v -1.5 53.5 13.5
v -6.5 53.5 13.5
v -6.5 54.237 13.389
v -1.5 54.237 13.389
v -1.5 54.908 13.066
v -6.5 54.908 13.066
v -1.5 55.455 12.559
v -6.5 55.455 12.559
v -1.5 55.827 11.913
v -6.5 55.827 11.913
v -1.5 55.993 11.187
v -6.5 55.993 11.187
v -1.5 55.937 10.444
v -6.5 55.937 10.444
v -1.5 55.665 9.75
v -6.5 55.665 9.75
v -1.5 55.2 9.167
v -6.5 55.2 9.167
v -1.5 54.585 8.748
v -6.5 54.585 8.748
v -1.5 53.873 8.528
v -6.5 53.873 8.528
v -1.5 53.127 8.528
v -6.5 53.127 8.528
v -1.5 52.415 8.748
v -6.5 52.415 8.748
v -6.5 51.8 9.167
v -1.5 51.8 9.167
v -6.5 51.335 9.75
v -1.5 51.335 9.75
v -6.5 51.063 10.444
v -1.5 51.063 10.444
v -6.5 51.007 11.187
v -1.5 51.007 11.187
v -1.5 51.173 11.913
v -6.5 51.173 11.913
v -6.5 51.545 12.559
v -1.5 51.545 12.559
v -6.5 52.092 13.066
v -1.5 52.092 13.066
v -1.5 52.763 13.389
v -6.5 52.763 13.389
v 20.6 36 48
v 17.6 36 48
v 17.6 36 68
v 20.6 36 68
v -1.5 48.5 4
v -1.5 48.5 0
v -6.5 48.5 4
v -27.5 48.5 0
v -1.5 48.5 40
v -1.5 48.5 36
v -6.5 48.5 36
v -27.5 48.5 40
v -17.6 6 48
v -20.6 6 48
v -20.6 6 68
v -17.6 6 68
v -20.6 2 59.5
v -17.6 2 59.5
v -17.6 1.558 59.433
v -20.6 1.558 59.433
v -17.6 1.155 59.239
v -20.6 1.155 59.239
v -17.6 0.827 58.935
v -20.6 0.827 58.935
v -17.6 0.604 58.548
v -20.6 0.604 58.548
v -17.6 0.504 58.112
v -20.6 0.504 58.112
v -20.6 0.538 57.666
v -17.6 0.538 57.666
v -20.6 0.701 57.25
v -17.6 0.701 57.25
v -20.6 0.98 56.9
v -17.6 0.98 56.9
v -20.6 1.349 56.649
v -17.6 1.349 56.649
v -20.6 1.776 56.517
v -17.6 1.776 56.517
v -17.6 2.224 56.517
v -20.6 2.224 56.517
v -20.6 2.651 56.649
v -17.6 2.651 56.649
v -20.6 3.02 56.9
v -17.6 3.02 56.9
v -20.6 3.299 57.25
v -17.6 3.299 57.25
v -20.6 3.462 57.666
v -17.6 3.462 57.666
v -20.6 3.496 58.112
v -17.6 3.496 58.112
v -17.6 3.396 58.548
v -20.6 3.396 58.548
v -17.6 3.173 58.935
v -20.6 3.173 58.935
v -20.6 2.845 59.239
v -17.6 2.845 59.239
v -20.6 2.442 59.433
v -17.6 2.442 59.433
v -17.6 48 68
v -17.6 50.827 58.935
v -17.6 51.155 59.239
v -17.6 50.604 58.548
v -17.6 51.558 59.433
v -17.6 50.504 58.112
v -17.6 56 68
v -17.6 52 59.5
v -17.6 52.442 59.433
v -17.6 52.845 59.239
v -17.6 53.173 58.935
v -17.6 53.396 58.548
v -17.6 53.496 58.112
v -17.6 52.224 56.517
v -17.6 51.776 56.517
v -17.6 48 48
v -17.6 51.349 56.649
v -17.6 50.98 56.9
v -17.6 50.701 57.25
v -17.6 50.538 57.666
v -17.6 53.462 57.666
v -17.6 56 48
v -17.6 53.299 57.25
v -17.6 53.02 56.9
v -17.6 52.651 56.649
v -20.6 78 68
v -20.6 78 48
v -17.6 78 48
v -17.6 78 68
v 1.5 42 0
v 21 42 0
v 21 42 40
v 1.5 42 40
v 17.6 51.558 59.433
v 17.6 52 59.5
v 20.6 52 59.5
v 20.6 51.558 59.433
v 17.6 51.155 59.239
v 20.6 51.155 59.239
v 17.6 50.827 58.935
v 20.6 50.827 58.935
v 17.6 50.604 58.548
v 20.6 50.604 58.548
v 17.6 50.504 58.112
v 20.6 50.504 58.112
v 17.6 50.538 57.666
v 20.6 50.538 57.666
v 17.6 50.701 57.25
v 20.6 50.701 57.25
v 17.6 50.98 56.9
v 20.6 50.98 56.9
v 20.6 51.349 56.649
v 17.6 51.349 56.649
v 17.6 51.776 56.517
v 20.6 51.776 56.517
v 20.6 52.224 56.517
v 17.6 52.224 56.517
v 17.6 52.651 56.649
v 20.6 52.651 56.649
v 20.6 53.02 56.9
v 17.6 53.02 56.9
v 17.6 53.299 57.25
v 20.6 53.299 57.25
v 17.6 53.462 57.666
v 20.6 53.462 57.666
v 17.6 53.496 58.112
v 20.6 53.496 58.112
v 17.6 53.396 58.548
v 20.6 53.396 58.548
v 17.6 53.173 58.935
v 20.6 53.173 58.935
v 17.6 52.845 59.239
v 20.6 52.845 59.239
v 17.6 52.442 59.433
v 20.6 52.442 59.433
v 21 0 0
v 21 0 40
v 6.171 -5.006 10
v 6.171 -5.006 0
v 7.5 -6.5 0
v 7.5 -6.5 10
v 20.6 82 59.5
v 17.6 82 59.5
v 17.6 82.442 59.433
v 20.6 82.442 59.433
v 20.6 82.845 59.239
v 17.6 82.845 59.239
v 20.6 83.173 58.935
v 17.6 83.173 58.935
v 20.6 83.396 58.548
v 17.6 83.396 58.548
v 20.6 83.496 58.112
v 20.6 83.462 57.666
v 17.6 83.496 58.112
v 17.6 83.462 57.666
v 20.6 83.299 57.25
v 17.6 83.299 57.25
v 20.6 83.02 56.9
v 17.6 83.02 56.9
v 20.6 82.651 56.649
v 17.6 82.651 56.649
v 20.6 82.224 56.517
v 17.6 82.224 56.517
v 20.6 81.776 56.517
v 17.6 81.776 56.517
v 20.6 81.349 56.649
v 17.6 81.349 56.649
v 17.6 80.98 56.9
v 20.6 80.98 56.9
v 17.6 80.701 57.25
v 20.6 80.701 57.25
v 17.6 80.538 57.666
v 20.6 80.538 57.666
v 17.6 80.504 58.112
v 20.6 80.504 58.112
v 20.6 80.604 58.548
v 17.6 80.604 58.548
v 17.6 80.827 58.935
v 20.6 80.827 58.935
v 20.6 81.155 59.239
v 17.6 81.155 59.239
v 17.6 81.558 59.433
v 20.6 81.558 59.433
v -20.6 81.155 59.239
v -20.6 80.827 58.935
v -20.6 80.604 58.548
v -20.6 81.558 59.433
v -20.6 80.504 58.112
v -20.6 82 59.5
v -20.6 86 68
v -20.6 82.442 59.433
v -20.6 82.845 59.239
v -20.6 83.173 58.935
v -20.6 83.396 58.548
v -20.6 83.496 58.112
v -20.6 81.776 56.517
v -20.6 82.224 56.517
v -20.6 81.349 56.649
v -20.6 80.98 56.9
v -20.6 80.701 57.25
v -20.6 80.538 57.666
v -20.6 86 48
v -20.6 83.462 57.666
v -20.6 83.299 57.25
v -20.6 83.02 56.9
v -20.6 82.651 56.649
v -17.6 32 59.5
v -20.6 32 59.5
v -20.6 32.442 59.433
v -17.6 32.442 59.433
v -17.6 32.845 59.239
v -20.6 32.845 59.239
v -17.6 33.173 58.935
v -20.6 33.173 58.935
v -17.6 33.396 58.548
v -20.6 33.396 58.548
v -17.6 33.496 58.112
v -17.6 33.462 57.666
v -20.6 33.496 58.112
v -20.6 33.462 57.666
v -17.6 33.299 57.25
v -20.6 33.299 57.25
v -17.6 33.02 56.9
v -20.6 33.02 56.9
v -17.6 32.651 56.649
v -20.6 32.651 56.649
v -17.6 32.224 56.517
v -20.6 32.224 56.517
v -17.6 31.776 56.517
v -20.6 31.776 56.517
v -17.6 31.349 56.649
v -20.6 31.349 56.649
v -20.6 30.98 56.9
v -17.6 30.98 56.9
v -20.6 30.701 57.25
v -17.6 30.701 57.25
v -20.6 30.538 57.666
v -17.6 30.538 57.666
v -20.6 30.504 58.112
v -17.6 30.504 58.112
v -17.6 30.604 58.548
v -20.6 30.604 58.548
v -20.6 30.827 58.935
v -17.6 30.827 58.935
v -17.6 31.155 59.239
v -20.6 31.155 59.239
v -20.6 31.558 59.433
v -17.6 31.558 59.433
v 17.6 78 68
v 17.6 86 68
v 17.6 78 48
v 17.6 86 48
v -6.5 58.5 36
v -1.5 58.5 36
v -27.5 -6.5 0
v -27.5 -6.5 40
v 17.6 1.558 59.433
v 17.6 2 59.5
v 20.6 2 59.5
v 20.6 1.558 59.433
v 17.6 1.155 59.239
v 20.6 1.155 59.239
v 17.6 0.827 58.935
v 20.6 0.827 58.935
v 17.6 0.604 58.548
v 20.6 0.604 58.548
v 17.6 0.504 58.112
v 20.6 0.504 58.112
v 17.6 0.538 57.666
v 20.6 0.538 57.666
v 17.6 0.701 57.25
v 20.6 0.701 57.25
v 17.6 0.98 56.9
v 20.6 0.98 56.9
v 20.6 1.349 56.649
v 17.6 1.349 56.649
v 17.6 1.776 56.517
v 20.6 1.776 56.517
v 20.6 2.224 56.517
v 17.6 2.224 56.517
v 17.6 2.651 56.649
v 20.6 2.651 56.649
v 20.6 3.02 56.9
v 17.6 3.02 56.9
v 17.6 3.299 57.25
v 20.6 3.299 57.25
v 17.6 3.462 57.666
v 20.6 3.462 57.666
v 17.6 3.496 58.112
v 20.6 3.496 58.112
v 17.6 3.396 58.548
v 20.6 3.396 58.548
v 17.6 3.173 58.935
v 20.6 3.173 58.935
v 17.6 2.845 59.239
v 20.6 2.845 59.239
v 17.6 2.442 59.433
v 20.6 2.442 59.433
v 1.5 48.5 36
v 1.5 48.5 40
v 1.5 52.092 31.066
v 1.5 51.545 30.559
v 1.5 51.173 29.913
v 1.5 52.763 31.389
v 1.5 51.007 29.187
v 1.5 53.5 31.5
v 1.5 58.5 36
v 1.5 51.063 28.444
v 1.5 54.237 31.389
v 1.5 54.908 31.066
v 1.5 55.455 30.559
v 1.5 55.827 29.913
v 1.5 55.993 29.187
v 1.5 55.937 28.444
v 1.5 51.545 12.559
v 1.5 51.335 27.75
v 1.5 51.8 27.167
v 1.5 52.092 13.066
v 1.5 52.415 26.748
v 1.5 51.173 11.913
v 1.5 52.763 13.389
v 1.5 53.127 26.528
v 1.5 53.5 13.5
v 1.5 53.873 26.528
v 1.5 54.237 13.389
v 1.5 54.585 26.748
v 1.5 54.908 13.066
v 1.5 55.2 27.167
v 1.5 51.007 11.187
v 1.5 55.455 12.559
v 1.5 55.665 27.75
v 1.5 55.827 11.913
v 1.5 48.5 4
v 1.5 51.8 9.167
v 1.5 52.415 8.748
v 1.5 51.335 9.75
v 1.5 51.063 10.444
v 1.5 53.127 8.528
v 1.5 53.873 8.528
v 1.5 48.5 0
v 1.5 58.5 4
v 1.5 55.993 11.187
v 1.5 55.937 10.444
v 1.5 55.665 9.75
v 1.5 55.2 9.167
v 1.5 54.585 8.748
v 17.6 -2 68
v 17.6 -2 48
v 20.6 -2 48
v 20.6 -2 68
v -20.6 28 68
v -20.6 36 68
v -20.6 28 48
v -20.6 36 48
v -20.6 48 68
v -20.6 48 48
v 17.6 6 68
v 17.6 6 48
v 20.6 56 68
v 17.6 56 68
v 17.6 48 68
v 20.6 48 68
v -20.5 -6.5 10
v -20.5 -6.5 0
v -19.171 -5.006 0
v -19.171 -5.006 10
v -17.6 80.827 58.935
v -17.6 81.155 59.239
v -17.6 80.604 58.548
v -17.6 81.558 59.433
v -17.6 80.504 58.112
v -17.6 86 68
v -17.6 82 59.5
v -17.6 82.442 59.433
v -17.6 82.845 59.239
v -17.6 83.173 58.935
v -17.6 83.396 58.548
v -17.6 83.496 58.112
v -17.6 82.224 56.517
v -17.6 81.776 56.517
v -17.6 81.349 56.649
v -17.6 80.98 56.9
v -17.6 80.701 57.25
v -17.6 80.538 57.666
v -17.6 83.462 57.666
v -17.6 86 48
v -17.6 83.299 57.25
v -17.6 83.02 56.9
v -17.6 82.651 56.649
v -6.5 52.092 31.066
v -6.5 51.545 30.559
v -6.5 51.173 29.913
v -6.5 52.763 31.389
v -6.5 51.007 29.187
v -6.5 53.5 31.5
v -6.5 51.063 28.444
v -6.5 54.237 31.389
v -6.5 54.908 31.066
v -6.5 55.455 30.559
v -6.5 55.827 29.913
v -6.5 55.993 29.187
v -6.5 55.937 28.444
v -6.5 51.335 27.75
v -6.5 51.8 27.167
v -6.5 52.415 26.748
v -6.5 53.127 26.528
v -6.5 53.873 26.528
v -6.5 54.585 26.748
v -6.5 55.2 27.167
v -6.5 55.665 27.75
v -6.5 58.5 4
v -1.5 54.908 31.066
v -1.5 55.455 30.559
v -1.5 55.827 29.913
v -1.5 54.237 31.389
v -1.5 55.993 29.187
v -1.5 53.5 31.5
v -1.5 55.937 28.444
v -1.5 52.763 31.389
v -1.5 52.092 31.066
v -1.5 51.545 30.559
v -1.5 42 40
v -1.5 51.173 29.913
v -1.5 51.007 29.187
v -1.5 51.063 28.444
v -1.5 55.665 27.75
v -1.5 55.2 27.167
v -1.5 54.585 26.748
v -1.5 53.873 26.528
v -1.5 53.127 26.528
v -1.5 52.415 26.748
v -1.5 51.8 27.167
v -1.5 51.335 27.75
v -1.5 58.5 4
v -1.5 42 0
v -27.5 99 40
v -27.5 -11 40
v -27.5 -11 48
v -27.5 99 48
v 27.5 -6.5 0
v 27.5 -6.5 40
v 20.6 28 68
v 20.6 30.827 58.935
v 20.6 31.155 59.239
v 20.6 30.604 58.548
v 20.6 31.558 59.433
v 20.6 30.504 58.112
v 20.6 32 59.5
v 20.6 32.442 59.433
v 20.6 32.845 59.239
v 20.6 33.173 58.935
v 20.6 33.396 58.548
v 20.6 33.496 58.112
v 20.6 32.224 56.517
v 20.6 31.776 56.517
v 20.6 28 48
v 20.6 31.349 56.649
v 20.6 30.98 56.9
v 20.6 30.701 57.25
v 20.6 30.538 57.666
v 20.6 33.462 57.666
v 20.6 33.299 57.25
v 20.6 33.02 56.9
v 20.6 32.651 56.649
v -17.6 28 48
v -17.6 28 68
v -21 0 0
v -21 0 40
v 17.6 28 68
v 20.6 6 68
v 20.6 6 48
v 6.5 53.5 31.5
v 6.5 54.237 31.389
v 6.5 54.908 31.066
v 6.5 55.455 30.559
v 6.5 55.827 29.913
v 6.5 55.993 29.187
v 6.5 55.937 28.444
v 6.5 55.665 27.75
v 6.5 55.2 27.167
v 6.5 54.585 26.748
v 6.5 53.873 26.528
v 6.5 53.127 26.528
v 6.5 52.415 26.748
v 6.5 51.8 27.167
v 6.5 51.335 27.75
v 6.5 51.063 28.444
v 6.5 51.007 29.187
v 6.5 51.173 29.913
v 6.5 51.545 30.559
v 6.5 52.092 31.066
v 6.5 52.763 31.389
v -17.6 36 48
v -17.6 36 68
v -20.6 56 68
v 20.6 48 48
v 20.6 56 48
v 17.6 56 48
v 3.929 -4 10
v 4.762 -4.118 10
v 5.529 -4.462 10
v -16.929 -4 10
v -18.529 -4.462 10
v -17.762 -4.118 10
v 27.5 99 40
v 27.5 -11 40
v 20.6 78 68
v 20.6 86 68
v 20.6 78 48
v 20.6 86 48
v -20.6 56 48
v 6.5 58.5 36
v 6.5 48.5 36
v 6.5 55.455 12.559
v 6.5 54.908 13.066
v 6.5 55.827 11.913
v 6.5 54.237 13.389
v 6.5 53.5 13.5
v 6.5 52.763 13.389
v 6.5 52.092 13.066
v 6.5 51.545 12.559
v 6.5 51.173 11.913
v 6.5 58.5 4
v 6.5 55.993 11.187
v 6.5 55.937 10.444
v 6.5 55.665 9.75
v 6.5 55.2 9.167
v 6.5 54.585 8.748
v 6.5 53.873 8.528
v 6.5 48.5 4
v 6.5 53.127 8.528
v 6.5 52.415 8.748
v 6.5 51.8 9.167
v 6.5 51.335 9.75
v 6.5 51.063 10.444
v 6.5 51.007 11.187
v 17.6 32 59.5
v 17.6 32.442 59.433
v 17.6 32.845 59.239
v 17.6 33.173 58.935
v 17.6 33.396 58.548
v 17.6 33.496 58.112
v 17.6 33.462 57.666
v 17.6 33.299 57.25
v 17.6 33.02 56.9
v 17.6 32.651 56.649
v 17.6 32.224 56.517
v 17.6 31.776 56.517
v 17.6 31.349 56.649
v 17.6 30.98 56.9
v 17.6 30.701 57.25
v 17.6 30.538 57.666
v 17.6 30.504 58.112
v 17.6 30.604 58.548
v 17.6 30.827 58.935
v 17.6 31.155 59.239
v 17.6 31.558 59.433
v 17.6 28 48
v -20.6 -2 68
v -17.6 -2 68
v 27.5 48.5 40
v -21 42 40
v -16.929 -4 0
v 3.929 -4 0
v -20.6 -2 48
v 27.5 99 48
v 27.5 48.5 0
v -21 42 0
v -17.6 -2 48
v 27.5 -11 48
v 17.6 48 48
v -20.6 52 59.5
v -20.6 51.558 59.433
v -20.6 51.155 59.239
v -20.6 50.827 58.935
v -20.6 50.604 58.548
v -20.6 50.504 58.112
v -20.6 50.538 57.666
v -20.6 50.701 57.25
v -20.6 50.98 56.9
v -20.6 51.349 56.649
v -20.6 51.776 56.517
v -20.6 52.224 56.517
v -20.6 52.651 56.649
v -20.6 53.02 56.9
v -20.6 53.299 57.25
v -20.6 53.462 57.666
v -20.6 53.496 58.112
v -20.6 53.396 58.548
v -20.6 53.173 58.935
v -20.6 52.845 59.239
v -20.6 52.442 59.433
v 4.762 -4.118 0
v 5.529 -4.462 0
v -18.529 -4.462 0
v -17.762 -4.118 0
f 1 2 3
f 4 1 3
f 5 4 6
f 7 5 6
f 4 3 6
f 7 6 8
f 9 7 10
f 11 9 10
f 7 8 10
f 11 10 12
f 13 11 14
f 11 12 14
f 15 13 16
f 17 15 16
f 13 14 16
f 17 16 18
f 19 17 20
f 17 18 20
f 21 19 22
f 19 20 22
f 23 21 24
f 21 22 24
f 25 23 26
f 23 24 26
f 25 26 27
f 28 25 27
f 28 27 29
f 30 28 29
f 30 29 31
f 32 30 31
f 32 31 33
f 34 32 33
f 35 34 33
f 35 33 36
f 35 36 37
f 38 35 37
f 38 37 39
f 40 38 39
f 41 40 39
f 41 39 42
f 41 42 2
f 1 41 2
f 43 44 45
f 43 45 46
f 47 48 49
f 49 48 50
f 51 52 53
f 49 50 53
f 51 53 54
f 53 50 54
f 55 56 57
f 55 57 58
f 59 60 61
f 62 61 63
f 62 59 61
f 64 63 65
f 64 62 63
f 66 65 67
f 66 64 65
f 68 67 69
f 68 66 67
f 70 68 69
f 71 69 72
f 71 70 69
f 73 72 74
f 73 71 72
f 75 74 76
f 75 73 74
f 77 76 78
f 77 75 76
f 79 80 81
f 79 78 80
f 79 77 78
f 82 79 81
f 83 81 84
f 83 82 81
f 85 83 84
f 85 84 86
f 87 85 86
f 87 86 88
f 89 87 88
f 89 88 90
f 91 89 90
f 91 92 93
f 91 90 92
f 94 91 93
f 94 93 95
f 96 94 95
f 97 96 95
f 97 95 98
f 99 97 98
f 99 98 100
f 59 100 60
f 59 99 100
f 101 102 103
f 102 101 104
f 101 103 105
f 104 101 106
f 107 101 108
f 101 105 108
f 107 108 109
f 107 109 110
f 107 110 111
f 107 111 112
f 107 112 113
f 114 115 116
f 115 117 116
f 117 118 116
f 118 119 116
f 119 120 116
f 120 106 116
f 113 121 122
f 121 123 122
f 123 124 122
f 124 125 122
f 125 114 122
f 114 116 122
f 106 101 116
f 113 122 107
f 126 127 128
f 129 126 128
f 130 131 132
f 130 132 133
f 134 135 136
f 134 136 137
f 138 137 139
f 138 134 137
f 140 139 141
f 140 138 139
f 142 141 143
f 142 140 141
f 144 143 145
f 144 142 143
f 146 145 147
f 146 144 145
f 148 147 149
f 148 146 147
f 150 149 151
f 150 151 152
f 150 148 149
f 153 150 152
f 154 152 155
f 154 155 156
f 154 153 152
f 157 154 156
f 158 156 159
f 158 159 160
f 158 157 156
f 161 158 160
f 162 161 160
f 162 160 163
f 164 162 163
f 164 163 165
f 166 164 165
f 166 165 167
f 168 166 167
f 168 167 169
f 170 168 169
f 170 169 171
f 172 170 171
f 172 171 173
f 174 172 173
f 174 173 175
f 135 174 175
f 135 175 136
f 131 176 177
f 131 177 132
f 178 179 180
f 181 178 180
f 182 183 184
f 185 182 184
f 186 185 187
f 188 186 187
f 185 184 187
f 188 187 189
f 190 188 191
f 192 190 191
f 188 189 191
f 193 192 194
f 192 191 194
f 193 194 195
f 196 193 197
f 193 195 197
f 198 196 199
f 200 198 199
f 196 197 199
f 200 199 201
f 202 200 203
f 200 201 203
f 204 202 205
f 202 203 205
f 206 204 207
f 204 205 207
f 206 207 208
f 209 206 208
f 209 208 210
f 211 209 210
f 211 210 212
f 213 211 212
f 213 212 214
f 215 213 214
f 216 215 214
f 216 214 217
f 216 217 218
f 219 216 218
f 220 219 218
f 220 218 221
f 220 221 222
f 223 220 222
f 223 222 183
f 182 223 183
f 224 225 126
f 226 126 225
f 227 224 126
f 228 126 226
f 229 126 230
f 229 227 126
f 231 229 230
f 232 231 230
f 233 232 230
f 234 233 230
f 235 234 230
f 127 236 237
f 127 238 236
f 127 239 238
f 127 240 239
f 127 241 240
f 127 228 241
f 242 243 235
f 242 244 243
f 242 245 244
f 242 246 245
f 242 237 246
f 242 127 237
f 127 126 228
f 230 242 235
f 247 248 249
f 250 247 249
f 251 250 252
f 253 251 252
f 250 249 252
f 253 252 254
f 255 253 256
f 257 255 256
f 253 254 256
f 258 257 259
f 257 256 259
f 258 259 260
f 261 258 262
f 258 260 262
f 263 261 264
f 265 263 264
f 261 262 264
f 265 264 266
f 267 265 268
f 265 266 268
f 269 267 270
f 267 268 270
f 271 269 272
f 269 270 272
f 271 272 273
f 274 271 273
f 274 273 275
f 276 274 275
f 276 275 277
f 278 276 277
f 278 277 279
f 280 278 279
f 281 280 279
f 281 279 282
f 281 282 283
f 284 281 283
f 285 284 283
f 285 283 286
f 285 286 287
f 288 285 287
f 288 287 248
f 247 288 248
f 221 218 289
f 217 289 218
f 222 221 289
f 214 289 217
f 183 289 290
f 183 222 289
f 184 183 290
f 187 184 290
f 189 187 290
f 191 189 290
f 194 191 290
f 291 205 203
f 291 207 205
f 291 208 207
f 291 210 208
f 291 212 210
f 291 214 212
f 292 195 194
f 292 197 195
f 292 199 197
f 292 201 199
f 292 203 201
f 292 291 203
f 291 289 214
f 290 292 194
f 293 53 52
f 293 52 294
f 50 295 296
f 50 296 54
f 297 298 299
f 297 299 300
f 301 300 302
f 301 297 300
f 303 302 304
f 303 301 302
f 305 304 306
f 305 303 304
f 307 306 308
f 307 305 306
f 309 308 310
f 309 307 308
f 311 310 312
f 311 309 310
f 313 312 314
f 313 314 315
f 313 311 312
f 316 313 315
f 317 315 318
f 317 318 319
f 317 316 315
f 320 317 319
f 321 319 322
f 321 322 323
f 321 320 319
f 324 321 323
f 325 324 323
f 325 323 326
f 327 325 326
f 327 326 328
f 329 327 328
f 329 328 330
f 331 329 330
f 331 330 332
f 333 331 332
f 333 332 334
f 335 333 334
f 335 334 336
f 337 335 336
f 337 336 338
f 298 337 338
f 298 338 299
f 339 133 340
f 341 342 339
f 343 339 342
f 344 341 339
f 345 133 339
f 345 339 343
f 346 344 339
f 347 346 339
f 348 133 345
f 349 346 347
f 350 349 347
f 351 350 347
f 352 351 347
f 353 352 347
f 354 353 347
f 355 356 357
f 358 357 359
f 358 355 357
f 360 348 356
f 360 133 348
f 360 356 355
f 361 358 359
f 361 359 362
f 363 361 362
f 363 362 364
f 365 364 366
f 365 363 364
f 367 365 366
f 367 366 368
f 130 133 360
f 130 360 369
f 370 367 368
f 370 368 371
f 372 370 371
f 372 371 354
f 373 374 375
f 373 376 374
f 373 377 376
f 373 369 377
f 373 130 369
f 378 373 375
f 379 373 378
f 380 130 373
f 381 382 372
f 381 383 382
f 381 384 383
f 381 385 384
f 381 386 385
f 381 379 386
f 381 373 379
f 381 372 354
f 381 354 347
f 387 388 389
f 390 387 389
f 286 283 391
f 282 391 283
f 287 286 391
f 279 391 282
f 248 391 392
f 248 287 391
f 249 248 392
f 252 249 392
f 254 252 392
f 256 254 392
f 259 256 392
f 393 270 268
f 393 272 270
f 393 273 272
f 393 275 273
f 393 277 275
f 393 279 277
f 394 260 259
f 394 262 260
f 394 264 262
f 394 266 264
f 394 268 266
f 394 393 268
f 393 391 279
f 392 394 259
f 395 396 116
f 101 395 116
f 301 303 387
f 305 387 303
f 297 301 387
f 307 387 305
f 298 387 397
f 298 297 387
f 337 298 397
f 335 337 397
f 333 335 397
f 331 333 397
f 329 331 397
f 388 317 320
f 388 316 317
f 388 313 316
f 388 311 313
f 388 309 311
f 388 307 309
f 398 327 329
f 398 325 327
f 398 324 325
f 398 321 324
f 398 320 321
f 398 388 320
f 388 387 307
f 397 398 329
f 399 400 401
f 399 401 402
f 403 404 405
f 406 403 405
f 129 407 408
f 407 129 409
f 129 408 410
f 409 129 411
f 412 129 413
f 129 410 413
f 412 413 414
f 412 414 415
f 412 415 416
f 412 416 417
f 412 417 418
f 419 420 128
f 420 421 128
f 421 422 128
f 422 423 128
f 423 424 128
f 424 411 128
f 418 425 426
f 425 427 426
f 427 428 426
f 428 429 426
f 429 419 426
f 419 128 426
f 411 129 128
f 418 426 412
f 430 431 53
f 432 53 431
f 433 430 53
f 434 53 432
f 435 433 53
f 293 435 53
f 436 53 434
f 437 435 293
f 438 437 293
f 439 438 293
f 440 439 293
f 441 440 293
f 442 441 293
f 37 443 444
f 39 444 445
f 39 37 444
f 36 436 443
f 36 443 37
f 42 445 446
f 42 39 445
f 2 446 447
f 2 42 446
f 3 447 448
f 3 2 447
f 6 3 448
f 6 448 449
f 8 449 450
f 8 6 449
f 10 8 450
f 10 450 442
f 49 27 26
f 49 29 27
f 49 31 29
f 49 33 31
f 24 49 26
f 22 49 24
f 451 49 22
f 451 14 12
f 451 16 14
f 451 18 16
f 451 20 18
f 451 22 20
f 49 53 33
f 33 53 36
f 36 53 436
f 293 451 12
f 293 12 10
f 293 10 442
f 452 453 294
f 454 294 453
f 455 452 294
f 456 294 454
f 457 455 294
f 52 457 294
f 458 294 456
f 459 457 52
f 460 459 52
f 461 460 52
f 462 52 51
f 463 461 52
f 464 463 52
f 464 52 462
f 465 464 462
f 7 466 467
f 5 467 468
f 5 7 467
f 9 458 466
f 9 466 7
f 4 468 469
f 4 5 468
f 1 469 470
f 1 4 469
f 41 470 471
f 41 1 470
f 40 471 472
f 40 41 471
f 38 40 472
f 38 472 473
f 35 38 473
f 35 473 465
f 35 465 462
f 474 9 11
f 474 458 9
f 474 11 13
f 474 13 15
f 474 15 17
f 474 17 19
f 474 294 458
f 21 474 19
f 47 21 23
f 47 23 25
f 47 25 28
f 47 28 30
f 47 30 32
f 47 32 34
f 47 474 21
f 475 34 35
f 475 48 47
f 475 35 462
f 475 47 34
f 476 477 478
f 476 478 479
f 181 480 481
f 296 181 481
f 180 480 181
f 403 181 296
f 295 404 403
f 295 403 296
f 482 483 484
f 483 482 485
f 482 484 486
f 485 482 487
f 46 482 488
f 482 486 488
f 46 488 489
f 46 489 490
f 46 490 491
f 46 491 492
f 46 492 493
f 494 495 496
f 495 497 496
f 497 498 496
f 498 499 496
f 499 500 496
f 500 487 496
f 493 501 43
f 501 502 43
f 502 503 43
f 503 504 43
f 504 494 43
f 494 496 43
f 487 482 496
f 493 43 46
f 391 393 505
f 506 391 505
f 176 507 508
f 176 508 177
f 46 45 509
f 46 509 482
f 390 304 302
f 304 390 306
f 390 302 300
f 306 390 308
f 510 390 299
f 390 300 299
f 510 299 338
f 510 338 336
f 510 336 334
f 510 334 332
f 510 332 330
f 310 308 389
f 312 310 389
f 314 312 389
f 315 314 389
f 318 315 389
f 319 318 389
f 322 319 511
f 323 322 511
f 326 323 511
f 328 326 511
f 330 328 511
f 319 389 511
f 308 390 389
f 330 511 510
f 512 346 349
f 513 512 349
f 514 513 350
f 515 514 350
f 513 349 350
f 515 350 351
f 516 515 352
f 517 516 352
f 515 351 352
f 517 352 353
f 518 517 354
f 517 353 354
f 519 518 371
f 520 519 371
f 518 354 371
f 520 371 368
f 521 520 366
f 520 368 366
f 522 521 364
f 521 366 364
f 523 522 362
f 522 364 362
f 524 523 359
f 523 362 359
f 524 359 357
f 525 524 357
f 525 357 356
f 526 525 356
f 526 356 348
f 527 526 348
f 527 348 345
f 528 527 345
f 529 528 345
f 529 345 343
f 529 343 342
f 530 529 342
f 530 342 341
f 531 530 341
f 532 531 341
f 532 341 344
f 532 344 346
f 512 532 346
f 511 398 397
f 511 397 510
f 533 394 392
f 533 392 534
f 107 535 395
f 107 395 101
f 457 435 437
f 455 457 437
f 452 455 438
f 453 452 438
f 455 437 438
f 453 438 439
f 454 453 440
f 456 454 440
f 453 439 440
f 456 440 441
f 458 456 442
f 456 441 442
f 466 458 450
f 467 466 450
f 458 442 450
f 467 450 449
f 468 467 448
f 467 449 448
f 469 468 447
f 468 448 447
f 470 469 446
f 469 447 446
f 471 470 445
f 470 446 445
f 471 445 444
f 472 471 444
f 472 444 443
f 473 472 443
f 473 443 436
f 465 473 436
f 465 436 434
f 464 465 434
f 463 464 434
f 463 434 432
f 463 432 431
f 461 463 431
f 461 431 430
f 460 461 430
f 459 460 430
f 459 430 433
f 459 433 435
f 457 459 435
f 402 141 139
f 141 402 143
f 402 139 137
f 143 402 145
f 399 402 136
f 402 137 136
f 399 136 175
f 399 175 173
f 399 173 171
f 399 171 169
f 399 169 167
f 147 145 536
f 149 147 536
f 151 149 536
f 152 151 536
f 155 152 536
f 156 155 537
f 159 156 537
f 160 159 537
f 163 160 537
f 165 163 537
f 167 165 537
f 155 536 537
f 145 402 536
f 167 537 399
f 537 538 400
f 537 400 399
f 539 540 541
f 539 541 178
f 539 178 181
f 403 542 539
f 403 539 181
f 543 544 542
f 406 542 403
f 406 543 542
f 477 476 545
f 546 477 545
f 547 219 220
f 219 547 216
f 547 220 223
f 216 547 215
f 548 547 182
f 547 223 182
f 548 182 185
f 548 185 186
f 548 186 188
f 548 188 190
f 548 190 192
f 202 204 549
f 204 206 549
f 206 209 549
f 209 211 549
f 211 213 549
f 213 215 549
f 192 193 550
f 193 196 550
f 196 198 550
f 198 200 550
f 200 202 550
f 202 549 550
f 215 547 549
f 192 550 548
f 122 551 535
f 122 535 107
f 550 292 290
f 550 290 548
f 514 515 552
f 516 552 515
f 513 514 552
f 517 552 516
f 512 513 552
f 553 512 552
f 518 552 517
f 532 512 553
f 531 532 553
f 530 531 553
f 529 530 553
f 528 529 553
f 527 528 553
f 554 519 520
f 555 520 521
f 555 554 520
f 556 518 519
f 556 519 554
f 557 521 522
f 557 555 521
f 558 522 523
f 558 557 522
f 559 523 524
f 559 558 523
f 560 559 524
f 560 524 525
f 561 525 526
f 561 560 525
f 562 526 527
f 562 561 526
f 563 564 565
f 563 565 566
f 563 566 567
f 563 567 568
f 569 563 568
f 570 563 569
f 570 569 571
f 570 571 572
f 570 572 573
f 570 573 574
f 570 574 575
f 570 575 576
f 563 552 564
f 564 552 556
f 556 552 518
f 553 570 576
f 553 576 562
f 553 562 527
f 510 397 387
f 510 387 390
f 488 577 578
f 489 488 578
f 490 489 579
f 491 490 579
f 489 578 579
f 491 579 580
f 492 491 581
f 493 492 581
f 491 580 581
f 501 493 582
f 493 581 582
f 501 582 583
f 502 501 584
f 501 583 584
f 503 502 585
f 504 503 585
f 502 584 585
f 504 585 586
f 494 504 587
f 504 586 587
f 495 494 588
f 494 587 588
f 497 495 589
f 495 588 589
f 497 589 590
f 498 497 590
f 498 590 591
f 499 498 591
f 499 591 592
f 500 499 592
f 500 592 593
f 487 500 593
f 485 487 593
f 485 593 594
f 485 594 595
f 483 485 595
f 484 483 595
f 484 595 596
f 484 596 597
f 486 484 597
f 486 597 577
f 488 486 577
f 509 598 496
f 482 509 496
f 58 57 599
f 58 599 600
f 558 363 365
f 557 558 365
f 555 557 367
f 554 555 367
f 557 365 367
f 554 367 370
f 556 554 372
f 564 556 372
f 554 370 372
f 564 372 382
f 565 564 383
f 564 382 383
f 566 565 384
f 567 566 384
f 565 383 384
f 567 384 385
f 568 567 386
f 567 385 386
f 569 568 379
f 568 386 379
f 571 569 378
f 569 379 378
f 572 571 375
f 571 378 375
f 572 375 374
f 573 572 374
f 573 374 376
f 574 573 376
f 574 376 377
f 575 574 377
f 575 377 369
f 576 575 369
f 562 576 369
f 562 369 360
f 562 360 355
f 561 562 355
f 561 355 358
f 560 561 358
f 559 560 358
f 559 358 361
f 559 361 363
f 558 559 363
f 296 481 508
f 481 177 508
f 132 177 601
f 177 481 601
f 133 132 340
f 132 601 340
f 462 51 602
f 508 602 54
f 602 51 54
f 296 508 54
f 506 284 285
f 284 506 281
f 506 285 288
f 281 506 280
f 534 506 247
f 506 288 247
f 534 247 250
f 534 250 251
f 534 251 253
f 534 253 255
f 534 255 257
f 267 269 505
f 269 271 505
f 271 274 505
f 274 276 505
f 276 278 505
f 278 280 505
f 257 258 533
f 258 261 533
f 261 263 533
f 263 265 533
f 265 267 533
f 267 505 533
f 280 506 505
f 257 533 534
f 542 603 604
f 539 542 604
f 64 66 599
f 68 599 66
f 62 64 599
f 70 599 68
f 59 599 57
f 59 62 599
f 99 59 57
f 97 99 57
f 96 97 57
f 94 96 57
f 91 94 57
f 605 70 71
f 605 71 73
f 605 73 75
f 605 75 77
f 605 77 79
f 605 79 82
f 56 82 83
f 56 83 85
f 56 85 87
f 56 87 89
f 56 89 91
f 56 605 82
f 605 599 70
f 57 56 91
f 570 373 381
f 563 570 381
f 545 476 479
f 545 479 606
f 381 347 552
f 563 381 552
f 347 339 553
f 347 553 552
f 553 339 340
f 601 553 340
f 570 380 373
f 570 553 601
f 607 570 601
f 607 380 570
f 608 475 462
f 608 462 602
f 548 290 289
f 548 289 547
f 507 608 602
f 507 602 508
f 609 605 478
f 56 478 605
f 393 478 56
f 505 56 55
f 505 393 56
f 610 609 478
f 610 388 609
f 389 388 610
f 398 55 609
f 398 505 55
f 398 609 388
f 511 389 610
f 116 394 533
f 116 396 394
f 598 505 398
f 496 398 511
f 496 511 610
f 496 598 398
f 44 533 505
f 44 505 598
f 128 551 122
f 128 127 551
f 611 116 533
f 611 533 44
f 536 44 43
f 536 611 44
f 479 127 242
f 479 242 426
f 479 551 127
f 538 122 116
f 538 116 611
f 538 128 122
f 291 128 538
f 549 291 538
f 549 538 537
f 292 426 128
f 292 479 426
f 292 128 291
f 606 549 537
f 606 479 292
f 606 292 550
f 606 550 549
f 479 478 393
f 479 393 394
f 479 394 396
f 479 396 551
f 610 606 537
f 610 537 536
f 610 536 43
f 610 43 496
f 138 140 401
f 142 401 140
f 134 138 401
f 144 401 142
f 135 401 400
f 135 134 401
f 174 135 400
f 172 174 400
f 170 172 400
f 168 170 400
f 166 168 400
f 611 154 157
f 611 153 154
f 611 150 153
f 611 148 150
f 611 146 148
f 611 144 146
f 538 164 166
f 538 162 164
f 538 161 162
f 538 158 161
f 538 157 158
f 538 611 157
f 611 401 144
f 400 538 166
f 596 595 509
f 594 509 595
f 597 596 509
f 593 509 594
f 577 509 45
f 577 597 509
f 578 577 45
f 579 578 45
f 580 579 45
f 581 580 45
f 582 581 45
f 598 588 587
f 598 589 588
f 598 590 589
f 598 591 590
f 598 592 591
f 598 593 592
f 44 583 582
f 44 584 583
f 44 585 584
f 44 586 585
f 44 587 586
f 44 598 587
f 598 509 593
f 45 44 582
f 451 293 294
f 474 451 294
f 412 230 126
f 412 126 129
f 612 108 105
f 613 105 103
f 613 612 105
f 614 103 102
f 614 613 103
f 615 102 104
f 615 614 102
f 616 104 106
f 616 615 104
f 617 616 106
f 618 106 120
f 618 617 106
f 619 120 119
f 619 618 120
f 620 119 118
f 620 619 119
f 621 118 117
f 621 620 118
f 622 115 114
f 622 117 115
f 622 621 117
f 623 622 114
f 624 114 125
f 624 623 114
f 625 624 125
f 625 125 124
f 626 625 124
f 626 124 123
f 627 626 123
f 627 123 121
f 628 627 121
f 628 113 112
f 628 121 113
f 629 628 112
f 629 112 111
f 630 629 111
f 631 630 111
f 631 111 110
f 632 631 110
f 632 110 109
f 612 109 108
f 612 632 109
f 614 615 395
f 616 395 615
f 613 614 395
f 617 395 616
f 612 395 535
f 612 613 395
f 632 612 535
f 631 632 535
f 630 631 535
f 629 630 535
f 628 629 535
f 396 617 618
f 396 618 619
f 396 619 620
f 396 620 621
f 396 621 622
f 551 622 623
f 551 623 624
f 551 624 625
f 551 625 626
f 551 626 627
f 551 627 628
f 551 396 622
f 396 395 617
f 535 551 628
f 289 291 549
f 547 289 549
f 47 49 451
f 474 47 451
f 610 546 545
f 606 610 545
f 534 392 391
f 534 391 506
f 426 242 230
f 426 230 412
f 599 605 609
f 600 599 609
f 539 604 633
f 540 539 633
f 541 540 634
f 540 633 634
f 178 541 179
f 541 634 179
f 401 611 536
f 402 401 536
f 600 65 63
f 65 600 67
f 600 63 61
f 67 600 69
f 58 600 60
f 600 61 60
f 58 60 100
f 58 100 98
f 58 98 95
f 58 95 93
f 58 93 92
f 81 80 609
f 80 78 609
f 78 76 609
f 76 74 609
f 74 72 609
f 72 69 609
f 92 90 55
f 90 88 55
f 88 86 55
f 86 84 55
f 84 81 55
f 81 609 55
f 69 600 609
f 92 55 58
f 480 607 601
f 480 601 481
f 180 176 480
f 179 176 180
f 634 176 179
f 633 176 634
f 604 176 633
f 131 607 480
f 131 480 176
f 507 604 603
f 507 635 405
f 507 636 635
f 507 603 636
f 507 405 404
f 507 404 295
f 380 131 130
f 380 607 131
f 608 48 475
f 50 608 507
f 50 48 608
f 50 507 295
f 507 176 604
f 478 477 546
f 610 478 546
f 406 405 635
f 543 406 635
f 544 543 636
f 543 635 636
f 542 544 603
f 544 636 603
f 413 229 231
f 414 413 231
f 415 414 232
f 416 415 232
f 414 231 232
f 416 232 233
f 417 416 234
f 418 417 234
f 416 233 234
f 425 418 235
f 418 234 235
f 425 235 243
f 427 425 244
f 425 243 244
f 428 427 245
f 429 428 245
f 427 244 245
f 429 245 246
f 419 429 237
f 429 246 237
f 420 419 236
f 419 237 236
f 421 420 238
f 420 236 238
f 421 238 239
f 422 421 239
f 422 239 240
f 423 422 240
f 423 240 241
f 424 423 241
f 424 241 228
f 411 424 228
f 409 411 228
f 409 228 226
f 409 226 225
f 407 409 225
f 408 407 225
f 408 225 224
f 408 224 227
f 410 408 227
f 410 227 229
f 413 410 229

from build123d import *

# Parameters (mm, degrees)
BOSS_EXTRUDE1_DEPTH     = 40
SKETCH2_R               = 2.5
CUT_EXTRUDE1_DEPTH      = 13
CUT_EXTRUDE2_DEPTH      = 10
SKETCH6_W               = 55
SKETCH6_H               = 110
BOSS_EXTRUDE8_DEPTH     = 8
SKETCH7_W               = 4
SKETCH7_H               = 10
CUT_EXTRUDE3_DEPTH      = 13
SKETCH11_W              = 3
SKETCH11_H              = 8
BOSS_EXTRUDE9_DEPTH     = 20
SKETCH12_R              = 1.5
CUT_EXTRUDE4_DEPTH      = 41.2
MIRROR3_COPY_1_SKETCH_R = 1.5
MIRROR3_COPY_1_DEPTH    = 41.2


with BuildPart() as part:
    # Sketch1 → Boss-Extrude1 (new body)
    with BuildSketch(Plane.XY):
        Polygon((-21, 0), (21, 0), (21, 42), (1.5, 42), (1.5, 58.5), (6.5, 58.5), (6.5, 48.5), (27.5, 48.5), (27.5, -6.5), (-27.5, -6.5), (-27.5, 48.5), (-6.5, 48.5), (-6.5, 58.5), (-1.5, 58.5), (-1.5, 42), (-21, 42), align=None)
    extrude(amount=BOSS_EXTRUDE1_DEPTH)

    # Sketch2 → Cut-Extrude1 (cut)
    with BuildSketch(Plane.ZY.offset(6.5)):
        with Locations((11, 53.5)):
            Circle(SKETCH2_R)
        with Locations((29, 53.5)):
            Circle(SKETCH2_R)
    extrude(amount=-CUT_EXTRUDE1_DEPTH, mode=Mode.SUBTRACT)

    # Sketch3 → Cut-Extrude2 (cut)
    with BuildSketch(Plane(origin=(0, 0, 0), x_dir=(-1, 0, 0), z_dir=(0, 0, -1))):
        with BuildLine():
            Line((20.5, -6.5), (19.170549473, -5.005824209))
            ThreePointArc((19.170549473, -5.005824209), (18.157592064, -4.262982703), (16.929285786, -4))
            Line((16.929285786, -4), (-3.929285786, -4))
            ThreePointArc((-3.929285786, -4), (-5.157592064, -4.262982703), (-6.170549473, -5.005824209))
            Line((-6.170549473, -5.005824209), (-7.5, -6.5))
            Line((-7.5, -6.5), (20.5, -6.5))
        make_face()
    extrude(amount=-CUT_EXTRUDE2_DEPTH, mode=Mode.SUBTRACT)

    # Sketch7 → Cut-Extrude3 (cut)
    with BuildSketch(Plane.ZY.offset(6.5)):
        with Locations((38, 53.5)):
            Rectangle(SKETCH7_W, SKETCH7_H)
        with Locations((2, 53.5)):
            Rectangle(SKETCH7_W, SKETCH7_H)
    extrude(amount=-CUT_EXTRUDE3_DEPTH, mode=Mode.SUBTRACT)


with BuildPart() as body_2:
    # Sketch6 → Boss-Extrude8 (new body)
    with BuildSketch(Plane.XY.offset(40)):
        with Locations((0, 44)):
            Rectangle(SKETCH6_W, SKETCH6_H)
    extrude(amount=BOSS_EXTRUDE8_DEPTH)

    # Sketch11 → Boss-Extrude9 (add)
    with BuildSketch(Plane.XY.offset(48)):
        with Locations((-19.1, 82)):
            Rectangle(SKETCH11_W, SKETCH11_H)
        with Locations((-19.1, 2)):
            Rectangle(SKETCH11_W, SKETCH11_H)
        with Locations((19.1, 2)):
            Rectangle(SKETCH11_W, SKETCH11_H)
        with Locations((19.1, 82)):
            Rectangle(SKETCH11_W, SKETCH11_H)
        with Locations((19.1, 52)):
            Rectangle(SKETCH11_W, SKETCH11_H)
        with Locations((-19.1, 52)):
            Rectangle(SKETCH11_W, SKETCH11_H)
        with Locations((19.1, 32)):
            Rectangle(SKETCH11_W, SKETCH11_H)
        with Locations((-19.1, 32)):
            Rectangle(SKETCH11_W, SKETCH11_H)
    extrude(amount=BOSS_EXTRUDE9_DEPTH)

    # Sketch12 → Cut-Extrude4 (cut)
    with BuildSketch(Plane.ZY.offset(20.6)):
        with Locations((58, 82)):
            Circle(SKETCH12_R)
    cut_extrude4 = extrude(amount=-CUT_EXTRUDE4_DEPTH, mode=Mode.SUBTRACT)

    # Mirror1: Cut-Extrude4 across plane
    add(cut_extrude4.mirror(Plane(origin=(0, 67, 0), x_dir=(0, 0, 1), z_dir=(0, -1, 0))), mode=Mode.SUBTRACT)

    # Mirror2: Cut-Extrude4 across plane
    add(cut_extrude4.mirror(Plane(origin=(0, 42, 0), x_dir=(0, 0, 1), z_dir=(0, -1, 0))), mode=Mode.SUBTRACT)

    # Mirror3 copy 1 sketch → Mirror3 copy 1 (cut)
    with BuildSketch(Plane(origin=(-20.6, -50, 0), x_dir=(0, 0, 1), z_dir=(-1, 0, 0))):
        with Locations((58, 82)):
            Circle(MIRROR3_COPY_1_SKETCH_R)
    extrude(amount=-MIRROR3_COPY_1_DEPTH, mode=Mode.SUBTRACT)


solid = Compound([part.part, body_2.part])
